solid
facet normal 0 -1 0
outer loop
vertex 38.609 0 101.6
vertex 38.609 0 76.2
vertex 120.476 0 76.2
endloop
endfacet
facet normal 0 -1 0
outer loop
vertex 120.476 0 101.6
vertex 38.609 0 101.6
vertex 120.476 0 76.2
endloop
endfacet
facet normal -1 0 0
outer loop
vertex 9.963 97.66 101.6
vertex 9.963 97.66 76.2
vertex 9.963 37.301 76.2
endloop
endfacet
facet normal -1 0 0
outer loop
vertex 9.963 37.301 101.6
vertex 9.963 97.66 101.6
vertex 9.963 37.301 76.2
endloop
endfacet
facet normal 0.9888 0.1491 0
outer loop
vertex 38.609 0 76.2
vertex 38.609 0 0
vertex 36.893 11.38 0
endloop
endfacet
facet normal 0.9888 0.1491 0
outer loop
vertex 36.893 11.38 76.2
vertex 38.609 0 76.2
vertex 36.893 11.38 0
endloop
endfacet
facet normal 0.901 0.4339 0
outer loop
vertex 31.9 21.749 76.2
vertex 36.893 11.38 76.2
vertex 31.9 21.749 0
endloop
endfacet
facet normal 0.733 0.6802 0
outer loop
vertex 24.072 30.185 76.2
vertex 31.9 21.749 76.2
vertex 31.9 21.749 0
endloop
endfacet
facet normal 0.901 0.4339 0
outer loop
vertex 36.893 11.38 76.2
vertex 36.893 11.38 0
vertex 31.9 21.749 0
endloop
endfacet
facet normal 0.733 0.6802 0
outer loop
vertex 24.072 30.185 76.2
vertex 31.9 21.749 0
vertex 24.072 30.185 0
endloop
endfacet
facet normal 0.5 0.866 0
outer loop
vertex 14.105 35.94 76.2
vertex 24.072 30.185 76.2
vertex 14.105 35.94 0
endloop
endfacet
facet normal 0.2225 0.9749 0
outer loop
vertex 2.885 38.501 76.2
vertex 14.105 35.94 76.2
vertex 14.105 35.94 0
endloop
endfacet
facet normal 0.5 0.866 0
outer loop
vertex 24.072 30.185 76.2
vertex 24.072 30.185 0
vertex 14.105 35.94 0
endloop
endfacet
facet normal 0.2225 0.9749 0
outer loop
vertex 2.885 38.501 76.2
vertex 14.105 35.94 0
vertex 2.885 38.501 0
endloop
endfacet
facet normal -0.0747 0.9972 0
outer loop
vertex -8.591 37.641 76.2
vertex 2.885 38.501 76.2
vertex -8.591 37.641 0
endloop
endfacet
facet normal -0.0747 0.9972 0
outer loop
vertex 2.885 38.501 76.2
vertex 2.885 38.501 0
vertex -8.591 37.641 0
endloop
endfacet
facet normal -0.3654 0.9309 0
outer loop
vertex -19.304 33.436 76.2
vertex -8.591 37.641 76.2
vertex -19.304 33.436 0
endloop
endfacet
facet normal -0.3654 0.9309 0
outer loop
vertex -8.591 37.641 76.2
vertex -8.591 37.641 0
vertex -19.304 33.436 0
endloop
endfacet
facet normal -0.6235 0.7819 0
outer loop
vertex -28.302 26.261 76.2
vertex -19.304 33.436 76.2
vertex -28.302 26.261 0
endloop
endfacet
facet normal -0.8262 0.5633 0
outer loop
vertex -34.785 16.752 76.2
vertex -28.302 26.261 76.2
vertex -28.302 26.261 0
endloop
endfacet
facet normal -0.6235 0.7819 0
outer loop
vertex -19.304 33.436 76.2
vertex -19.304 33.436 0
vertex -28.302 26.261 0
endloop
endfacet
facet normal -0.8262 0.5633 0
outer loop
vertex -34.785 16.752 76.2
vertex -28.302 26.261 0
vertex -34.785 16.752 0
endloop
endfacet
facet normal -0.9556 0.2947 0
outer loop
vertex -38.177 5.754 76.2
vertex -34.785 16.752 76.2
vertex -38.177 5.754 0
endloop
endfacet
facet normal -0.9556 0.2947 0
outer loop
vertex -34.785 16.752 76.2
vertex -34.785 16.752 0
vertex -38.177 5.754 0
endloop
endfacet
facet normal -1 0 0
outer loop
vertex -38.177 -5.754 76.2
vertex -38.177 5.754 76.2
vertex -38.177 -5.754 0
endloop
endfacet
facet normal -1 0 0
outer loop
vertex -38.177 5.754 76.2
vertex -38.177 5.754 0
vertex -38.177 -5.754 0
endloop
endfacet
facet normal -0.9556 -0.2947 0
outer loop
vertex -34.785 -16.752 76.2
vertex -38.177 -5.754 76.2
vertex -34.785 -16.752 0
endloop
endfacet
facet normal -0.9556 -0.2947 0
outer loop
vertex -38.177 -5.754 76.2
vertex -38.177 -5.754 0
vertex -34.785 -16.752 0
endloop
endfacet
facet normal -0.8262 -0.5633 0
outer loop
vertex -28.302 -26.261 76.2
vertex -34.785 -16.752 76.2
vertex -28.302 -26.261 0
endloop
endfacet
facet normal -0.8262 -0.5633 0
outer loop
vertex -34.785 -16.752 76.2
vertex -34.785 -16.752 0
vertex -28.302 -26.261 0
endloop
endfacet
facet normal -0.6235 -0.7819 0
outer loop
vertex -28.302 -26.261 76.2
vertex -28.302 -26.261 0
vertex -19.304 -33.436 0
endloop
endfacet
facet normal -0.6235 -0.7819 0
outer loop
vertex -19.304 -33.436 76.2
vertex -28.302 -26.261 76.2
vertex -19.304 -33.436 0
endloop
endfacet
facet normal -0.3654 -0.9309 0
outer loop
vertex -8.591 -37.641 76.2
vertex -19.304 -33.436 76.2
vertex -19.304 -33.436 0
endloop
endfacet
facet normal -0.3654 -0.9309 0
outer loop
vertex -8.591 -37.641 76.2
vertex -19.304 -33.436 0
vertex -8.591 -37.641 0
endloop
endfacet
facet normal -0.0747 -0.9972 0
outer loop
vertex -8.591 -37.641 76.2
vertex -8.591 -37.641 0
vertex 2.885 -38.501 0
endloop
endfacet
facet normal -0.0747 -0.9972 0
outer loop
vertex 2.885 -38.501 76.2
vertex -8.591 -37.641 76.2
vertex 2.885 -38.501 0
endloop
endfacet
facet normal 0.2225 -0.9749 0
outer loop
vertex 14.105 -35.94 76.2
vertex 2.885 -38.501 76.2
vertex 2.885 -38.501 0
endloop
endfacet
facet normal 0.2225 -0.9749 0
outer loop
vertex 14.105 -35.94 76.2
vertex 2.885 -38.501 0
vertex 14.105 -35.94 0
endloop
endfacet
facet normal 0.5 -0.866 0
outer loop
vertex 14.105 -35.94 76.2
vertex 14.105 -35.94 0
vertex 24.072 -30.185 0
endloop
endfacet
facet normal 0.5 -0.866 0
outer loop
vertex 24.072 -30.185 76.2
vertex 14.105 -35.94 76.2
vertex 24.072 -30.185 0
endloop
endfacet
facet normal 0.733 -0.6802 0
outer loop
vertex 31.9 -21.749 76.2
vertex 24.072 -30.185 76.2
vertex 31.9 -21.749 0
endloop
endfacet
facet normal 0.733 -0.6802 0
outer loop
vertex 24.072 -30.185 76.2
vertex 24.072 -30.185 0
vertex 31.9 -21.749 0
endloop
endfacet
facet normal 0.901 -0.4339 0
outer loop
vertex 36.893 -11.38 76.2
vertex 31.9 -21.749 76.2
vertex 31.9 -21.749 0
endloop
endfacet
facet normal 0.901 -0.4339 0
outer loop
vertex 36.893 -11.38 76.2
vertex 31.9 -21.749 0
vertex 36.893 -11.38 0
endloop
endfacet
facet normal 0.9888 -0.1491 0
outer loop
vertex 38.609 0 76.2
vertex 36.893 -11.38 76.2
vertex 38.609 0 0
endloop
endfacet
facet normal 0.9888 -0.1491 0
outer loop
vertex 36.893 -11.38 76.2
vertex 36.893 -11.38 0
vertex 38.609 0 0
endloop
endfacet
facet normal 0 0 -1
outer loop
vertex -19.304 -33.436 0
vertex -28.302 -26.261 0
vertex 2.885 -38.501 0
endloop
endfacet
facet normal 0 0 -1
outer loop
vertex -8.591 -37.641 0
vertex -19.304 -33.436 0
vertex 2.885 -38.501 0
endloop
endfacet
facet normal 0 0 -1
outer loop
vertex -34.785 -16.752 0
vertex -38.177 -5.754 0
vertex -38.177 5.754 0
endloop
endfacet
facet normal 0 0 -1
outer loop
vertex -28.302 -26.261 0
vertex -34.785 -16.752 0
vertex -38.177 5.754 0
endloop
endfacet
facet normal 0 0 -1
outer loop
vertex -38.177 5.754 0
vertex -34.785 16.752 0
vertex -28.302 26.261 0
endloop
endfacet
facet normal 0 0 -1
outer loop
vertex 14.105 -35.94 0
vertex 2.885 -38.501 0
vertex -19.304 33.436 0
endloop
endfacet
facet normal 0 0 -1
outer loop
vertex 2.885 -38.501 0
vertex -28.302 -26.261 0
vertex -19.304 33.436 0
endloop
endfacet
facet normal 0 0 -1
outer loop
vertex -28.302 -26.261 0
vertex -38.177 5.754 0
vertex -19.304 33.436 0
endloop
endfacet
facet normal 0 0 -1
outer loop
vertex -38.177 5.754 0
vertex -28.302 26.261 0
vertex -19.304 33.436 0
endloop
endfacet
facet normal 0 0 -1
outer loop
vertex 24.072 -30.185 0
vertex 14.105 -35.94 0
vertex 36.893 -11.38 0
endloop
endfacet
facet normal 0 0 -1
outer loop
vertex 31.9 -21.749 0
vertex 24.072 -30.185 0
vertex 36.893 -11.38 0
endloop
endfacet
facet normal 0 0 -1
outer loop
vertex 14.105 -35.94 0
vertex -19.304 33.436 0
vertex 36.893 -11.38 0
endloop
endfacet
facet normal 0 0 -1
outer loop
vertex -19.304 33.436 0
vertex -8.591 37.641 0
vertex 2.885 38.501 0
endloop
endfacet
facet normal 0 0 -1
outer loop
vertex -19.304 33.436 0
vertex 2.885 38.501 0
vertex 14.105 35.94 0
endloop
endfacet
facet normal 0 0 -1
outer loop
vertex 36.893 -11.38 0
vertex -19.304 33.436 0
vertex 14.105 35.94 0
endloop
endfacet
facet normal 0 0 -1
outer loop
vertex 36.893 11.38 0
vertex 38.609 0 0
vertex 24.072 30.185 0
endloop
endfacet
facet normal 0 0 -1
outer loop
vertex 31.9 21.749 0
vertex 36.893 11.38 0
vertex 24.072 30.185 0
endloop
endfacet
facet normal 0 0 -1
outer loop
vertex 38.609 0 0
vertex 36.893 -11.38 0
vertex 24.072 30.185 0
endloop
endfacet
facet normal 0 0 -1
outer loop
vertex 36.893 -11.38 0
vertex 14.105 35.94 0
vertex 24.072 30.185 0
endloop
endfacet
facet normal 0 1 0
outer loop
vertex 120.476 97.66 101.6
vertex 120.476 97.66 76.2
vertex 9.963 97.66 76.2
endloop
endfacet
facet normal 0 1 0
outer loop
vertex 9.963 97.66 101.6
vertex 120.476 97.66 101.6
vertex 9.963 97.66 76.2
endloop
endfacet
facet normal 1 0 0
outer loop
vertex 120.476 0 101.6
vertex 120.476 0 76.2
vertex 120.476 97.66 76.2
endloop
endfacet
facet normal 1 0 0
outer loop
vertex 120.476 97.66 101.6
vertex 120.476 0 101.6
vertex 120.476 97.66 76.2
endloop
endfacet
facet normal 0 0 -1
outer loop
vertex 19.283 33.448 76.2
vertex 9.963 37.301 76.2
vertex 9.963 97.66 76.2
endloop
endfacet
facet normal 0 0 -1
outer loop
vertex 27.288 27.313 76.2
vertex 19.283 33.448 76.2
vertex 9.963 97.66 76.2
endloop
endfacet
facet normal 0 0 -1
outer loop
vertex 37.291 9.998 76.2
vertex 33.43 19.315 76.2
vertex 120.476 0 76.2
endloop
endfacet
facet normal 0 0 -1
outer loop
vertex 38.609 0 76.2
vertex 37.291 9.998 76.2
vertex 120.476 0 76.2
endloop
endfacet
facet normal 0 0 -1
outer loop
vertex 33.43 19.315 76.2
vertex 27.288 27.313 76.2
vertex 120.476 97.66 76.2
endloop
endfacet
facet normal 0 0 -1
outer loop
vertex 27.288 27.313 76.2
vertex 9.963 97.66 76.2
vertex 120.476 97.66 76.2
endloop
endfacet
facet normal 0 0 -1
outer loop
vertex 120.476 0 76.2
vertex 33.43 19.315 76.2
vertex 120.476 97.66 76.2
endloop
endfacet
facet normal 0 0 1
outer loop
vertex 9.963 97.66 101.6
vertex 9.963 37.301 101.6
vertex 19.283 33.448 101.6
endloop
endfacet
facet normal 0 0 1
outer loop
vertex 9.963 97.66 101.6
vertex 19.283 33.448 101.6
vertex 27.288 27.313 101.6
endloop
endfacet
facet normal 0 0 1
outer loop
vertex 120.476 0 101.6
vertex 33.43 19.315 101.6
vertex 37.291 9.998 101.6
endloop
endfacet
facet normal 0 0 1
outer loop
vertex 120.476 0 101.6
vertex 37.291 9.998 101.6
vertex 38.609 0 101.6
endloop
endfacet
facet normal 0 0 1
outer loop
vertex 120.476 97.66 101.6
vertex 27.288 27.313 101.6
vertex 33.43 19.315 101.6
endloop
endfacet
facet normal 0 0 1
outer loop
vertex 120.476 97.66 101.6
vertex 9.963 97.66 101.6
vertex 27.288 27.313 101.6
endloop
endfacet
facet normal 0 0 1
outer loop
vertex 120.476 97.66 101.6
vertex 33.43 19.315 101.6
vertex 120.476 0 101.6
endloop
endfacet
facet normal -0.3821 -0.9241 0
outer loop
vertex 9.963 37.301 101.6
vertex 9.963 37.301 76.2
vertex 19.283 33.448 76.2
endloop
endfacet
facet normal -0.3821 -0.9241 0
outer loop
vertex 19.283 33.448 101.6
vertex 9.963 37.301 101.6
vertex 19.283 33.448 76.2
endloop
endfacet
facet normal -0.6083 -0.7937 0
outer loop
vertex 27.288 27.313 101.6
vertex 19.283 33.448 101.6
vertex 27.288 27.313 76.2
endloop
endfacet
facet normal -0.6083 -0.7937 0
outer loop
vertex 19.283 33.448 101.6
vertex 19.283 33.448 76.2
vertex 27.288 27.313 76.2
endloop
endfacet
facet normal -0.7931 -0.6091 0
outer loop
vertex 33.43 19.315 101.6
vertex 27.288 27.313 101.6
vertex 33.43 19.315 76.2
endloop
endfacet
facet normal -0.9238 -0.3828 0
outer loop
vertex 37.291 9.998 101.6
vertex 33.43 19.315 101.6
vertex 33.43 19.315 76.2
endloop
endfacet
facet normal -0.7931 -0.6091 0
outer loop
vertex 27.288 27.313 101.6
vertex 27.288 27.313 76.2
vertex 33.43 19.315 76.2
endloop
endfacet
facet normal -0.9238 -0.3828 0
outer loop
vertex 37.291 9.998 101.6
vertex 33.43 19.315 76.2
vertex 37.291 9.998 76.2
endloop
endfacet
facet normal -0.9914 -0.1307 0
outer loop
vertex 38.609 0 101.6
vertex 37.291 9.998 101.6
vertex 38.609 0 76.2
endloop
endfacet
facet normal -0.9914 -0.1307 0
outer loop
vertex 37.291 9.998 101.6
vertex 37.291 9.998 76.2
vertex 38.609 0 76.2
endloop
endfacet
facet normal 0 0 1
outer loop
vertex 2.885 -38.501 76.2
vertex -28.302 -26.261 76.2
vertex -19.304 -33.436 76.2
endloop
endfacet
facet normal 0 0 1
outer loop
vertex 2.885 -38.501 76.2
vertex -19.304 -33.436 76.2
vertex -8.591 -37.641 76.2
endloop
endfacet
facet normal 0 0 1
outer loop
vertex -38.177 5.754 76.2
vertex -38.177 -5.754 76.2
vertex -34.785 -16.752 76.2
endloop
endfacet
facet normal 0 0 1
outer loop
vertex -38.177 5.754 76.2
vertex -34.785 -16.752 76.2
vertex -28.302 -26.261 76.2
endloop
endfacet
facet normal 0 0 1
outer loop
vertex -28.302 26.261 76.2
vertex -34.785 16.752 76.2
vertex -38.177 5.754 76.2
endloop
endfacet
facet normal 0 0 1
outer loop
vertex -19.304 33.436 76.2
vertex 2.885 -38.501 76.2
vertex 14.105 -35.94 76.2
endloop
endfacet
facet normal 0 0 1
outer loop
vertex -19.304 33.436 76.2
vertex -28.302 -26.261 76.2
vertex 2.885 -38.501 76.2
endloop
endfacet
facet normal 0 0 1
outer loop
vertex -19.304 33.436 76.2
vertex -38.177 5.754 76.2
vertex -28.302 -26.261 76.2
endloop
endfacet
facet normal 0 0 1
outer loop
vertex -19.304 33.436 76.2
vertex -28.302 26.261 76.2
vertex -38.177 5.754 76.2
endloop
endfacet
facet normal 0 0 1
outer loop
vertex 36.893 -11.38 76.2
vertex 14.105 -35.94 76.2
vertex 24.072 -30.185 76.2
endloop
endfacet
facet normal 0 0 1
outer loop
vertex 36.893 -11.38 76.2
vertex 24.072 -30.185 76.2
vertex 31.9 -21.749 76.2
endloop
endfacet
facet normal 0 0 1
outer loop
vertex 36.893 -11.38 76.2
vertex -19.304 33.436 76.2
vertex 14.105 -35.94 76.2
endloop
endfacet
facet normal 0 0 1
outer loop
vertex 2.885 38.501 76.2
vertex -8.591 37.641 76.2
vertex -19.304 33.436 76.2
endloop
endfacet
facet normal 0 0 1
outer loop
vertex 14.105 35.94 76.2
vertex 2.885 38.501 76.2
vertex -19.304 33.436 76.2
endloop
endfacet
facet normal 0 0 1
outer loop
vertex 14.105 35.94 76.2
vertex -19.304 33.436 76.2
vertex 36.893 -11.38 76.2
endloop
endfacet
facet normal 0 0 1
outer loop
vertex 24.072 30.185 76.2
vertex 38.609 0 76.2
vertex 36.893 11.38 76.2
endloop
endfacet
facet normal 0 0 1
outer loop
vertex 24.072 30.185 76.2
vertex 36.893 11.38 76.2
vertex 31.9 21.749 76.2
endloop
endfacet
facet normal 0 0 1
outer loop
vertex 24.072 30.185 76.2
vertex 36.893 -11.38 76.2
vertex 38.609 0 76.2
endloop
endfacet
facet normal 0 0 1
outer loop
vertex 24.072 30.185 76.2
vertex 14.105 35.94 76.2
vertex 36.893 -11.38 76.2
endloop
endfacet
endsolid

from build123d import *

# Parameters (mm, degrees)
F0_R     = 38.608578
F1_DEPTH = 76.2
F3_DEPTH = 25.4


with BuildPart() as f1:
    # F0 (on Top) → F1 (new body)
    with BuildSketch(Plane.XY):
        Circle(F0_R)
    extrude(amount=F1_DEPTH)


with BuildPart() as f3:
    # F2 (on face) → F3 (new body)
    with BuildSketch(Plane.XY.offset(76.2)):
        with BuildLine():
            ThreePointArc((9.963408, 37.300842), (30.621033, 23.515413), (38.608578, 0))
            Line((38.608578, 0), (120.475784, 0))
            Line((120.475784, 0), (120.475784, 97.660244))
            Line((120.475784, 97.660244), (9.963408, 97.660244))
            Line((9.963408, 97.660244), (9.963408, 37.300842))
        make_face()
    extrude(amount=F3_DEPTH)


solid = Compound([f1.part, f3.part])
